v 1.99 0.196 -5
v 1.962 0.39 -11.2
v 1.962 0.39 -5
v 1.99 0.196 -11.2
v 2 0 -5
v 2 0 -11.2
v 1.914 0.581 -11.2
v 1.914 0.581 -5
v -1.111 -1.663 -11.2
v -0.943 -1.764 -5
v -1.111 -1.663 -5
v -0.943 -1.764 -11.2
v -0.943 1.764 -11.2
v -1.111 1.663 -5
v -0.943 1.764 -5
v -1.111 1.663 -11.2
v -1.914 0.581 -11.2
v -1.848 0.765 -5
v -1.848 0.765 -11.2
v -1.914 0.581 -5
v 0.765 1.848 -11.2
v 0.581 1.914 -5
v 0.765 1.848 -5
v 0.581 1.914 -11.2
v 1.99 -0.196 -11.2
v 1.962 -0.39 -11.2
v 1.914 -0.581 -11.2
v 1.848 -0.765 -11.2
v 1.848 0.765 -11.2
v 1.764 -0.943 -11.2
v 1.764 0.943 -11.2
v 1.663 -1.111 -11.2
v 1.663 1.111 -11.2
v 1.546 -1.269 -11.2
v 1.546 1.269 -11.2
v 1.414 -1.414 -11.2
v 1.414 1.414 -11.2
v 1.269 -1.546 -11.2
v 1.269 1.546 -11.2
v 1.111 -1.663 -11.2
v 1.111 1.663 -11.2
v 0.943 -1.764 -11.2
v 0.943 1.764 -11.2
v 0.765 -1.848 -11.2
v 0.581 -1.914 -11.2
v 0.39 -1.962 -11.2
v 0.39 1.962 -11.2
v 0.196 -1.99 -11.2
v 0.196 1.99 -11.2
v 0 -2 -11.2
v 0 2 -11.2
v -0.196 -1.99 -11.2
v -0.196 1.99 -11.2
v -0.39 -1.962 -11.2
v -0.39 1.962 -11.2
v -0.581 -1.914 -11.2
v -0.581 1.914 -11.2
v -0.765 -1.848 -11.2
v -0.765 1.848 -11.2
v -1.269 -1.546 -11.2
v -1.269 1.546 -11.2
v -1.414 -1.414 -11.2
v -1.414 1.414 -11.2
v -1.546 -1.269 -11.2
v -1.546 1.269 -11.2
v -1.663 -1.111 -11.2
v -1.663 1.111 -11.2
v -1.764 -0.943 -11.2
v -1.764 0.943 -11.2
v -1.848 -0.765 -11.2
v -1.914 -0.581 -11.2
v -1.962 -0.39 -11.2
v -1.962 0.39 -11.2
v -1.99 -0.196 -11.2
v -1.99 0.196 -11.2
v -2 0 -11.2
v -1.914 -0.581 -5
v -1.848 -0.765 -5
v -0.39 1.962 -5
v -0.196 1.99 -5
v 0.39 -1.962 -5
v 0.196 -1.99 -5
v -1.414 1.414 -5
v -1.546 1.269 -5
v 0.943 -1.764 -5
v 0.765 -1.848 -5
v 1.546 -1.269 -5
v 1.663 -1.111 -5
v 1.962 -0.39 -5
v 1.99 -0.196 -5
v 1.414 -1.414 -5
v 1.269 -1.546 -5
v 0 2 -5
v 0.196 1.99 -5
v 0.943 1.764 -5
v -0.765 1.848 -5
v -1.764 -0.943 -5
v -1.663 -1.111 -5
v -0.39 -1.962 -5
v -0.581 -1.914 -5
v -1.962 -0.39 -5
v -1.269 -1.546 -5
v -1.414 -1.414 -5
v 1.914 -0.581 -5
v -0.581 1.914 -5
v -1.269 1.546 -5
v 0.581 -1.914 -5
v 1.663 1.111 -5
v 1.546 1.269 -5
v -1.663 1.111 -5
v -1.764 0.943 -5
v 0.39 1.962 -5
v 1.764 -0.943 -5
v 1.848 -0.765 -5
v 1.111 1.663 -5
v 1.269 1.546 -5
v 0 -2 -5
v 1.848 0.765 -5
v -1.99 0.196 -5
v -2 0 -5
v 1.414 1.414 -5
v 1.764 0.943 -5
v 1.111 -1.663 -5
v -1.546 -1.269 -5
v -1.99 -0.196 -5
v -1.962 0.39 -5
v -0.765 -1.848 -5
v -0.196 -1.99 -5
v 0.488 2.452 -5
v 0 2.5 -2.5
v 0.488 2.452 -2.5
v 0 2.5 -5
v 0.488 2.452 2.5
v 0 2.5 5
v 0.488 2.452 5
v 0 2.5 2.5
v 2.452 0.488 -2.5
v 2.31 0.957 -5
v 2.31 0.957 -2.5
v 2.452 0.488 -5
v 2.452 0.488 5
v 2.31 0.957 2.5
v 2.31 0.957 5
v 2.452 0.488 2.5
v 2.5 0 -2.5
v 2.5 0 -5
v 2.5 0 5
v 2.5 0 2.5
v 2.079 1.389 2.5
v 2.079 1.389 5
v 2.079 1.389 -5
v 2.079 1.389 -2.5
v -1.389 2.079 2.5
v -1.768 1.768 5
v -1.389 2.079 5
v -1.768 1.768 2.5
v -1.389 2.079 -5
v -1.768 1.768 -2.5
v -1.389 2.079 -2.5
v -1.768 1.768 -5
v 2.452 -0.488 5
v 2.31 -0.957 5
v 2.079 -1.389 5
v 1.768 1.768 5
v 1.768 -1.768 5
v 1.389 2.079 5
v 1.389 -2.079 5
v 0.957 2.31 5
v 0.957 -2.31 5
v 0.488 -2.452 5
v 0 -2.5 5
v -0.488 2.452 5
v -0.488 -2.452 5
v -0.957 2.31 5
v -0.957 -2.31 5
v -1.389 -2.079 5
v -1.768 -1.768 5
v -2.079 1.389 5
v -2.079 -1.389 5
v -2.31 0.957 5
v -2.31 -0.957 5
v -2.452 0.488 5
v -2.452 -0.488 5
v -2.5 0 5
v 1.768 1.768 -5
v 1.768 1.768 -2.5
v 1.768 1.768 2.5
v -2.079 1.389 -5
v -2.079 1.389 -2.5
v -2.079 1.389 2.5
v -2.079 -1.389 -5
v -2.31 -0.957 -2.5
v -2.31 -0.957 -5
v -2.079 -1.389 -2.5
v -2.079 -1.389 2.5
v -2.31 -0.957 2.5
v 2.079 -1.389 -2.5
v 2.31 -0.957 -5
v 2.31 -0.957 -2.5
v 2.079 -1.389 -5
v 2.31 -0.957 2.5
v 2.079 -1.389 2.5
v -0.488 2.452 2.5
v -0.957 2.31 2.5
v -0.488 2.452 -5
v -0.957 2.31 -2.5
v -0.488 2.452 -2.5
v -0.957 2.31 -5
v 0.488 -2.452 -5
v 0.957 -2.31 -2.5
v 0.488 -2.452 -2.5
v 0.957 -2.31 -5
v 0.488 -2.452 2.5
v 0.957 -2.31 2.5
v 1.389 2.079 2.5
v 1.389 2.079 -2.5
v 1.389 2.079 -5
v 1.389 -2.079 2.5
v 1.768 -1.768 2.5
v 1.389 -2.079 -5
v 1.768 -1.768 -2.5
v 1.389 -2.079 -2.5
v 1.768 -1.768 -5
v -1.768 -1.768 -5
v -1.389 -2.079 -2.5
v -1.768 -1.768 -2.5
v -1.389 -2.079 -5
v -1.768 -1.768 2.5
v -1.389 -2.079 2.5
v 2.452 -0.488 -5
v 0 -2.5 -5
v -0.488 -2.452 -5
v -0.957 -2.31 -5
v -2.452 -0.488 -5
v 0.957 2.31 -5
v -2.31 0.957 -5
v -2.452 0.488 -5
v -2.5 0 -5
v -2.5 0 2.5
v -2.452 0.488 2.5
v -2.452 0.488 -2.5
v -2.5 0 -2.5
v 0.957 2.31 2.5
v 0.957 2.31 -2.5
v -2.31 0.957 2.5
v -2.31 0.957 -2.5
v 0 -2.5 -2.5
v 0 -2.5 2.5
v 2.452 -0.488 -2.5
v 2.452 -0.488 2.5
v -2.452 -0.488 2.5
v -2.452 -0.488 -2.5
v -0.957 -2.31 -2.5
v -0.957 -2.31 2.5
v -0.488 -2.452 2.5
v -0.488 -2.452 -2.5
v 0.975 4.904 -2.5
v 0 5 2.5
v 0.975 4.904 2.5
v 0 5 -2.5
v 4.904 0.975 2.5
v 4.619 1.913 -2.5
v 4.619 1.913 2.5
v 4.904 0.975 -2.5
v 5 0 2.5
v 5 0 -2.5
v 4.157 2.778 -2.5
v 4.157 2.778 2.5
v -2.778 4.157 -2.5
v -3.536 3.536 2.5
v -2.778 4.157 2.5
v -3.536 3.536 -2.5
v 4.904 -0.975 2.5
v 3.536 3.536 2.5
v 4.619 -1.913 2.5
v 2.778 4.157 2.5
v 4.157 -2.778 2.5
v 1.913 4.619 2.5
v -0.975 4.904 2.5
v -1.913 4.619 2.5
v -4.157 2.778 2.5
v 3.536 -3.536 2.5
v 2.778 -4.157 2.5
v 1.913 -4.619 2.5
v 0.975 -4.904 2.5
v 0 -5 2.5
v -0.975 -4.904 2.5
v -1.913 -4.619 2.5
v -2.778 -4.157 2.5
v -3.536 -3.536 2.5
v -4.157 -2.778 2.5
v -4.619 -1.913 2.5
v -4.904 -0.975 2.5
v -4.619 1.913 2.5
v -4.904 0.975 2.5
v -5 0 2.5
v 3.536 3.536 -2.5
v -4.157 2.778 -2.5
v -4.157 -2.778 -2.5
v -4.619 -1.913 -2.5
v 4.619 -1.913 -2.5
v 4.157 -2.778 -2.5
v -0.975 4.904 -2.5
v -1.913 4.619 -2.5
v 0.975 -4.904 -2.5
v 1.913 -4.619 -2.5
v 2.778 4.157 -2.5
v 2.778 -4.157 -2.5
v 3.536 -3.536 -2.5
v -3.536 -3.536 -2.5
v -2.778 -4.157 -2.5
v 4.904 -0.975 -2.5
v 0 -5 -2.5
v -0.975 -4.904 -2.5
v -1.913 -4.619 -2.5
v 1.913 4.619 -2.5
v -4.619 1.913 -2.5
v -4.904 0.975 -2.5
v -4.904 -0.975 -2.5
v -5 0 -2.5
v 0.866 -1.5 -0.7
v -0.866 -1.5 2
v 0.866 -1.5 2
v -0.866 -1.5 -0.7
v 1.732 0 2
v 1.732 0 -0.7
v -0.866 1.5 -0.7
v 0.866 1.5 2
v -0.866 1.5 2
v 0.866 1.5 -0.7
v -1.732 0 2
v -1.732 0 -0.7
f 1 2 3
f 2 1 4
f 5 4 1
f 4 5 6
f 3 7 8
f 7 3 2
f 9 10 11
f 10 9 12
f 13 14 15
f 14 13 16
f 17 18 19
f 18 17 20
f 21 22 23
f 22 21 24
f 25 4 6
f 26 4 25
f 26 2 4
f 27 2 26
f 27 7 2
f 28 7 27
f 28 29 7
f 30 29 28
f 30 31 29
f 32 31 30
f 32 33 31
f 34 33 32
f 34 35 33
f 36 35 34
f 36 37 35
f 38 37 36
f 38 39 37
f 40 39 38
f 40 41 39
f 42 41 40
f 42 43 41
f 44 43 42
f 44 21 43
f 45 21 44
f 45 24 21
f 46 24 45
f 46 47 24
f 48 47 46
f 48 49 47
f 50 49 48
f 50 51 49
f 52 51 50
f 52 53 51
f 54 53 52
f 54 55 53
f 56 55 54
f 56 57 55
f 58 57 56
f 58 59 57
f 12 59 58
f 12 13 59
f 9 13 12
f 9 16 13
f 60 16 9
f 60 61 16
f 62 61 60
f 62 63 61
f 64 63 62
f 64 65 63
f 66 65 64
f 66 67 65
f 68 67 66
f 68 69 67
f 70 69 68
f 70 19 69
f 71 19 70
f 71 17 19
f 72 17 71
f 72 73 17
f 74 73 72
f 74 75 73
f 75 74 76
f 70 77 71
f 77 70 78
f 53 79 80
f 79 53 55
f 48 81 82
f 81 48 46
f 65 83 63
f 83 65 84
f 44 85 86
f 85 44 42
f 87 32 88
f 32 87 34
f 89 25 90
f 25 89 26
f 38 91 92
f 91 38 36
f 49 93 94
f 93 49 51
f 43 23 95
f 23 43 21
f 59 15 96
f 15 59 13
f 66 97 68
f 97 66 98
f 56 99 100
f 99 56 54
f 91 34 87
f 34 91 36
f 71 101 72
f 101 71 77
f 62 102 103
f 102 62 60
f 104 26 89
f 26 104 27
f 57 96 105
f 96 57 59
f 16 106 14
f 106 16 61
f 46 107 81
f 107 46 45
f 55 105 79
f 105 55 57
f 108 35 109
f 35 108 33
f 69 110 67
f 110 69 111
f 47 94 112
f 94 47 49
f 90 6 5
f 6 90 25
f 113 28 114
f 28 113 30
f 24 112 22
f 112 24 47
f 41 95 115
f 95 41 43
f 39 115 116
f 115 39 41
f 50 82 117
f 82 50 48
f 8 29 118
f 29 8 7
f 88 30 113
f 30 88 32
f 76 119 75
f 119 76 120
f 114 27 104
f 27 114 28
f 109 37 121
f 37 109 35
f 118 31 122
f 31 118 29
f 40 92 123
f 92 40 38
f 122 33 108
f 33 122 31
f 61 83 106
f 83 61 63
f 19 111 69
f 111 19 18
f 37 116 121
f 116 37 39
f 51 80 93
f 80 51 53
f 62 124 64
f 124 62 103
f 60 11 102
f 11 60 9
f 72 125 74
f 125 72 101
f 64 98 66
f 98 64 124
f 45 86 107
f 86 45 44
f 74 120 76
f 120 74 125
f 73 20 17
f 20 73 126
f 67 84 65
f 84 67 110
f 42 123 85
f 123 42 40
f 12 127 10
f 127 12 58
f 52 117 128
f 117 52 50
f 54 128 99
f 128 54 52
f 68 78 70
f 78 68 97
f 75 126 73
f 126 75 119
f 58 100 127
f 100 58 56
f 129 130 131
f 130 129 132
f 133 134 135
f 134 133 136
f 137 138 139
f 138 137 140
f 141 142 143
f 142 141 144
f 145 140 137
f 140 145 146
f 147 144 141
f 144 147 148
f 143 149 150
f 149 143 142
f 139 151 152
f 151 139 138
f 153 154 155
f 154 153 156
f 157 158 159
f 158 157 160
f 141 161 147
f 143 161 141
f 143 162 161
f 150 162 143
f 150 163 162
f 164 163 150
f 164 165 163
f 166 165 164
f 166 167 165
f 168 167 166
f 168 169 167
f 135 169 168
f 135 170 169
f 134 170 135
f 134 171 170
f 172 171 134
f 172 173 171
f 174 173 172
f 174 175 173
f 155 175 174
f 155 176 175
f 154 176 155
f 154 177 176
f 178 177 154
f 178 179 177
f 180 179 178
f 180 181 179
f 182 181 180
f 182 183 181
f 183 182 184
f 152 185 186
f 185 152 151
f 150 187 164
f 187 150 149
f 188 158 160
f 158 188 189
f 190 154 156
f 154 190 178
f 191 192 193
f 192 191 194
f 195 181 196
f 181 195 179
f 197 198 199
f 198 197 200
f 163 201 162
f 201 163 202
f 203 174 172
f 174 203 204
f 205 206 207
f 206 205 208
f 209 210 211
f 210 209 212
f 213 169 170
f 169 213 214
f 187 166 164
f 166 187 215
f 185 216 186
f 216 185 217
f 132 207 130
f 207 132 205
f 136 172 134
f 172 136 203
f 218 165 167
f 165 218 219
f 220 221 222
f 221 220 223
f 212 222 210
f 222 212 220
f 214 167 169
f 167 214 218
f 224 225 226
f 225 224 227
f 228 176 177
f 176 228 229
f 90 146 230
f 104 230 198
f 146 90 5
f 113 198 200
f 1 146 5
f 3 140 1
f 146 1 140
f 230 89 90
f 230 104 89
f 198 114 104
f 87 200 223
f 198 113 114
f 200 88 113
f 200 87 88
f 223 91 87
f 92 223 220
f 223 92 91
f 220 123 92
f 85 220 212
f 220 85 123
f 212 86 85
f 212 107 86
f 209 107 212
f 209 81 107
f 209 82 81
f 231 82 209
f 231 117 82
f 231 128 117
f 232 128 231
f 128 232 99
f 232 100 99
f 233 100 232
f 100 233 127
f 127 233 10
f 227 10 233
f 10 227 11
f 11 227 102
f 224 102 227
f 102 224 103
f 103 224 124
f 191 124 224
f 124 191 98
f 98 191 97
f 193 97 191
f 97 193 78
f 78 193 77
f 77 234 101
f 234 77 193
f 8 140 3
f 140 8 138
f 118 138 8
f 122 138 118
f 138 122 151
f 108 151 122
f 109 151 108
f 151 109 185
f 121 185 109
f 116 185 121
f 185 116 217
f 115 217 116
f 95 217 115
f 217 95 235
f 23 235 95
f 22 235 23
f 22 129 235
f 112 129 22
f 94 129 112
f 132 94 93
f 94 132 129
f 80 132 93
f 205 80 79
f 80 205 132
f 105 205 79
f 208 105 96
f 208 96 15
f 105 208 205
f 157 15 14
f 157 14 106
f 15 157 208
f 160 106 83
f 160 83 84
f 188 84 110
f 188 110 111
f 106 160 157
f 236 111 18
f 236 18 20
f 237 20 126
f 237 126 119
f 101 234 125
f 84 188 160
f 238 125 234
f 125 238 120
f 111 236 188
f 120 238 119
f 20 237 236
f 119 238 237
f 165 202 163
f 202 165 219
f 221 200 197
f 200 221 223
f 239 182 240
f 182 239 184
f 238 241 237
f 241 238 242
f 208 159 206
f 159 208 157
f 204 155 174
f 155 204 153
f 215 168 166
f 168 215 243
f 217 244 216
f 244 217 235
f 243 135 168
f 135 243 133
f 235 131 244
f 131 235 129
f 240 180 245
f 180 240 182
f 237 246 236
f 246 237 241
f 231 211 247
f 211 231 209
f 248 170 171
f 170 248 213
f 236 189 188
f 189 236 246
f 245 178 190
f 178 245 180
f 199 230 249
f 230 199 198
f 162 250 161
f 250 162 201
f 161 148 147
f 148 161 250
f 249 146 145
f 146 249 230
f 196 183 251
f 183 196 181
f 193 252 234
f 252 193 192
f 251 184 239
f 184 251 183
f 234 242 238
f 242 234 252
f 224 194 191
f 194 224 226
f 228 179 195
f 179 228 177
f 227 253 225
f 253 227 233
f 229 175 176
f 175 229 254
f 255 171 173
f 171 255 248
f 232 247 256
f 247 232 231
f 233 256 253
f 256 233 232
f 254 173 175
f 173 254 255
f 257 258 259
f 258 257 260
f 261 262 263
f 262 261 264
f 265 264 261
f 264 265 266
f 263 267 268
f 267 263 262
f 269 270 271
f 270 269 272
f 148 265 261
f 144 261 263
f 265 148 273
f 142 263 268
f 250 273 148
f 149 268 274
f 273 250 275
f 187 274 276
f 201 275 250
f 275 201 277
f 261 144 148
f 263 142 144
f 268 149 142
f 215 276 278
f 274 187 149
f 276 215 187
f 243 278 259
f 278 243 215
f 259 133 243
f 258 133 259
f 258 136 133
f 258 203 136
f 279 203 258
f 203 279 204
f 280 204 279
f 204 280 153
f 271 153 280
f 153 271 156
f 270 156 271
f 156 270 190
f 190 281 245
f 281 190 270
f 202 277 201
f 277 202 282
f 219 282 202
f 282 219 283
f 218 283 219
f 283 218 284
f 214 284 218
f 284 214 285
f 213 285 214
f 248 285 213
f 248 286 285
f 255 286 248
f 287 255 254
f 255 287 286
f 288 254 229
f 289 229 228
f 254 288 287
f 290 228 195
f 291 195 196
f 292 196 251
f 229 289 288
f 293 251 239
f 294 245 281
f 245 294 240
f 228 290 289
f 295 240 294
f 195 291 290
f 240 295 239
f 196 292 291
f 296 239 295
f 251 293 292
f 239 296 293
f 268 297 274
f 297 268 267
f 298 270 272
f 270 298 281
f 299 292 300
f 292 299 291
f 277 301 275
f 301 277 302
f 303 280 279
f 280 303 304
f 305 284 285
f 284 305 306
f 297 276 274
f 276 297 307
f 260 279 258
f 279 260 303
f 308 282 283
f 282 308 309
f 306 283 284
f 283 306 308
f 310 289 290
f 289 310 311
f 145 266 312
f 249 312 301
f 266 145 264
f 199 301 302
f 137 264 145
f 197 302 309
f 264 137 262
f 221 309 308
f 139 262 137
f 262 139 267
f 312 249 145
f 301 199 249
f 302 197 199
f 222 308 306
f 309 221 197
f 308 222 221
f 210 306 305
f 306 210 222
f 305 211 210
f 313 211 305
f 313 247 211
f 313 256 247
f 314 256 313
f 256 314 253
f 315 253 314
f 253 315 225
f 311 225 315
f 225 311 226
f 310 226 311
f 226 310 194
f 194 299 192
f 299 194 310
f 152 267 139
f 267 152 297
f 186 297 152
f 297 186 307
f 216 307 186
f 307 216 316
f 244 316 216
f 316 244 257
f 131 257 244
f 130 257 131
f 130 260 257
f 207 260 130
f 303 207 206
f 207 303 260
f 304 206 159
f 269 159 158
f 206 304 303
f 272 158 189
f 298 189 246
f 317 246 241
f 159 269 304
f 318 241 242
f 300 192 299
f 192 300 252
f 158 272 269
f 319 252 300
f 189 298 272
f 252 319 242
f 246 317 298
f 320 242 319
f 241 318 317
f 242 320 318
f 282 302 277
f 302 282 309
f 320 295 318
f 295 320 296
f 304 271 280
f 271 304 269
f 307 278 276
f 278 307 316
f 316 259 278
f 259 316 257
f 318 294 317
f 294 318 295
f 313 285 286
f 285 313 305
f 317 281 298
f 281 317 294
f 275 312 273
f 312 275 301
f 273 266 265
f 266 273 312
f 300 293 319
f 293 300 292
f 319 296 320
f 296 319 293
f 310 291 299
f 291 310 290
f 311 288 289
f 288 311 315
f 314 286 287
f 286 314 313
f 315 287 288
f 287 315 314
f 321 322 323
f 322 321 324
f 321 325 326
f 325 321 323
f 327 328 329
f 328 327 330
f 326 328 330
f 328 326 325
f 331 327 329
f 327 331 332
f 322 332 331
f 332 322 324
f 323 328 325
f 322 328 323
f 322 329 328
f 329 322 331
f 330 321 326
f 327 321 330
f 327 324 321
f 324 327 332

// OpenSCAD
// Parameters
thread_nominal_diameter_mm = 4; //[2:8:0.1]
length_under_head_mm = 10; //[5:20:0.5]
head_diameter_mm = 7; //[3.5:14:0.1]
head_height_mm = 4; //[2:8:0.1]
thread_pitch_mm = 0.7; //[0.35:1.4:0.05]
thread_length_mm = 10; //[5:20:0.5]
shank_diameter_mm = 4; //[2:8:0.1]
socket_af_mm = 3; //[2:6:0.1]
socket_depth_mm = 2.5; //[1.5:5:0.1]
under_head_chamfer_height_mm = 0.6; //[0.3:1.2:0.05]
thread_runout_length_mm = 1.2; //[0.6:2.4:0.1]
overlap_mm = 0.8; //[0.2:2:0.1]
eps_mm = 0.2; //[0.05:0.5:0.05]

// Pin Socket - Custom detailed geometry
module pin_socket() {
  color("Silver") {
    // Simple representation of a pin socket
    cylinder(d=2, h=5, center=true, $fn=32);
  }
}

// Screw And Washer - Custom detailed geometry
module screw_and_washer() {
  color("DimGray") {
    // Simple representation of a screw with washer
    union() {
      cylinder(d=shank_diameter_mm, h=2, center=true, $fn=32);
      translate([0, 0, -1]) cylinder(d=shank_diameter_mm + 2, h=1, center=true, $fn=32);
    }
  }
}

// PCB Spacer - Custom detailed geometry
module pcb_spacer() {
  color("Black") {
    // Simple representation of a PCB spacer
    cylinder(d=5, h=10, center=true, $fn=32);
  }
}

// Buzzer - Custom detailed geometry
module buzzer() {
  color("Copper") {
    // Simple representation of a buzzer
    cylinder(d=10, h=5, center=true, $fn=32);
  }
}

// Main Screw with Hex Socket
module screw_with_hex_socket() {
  difference() {
    union() {
      // Cap Head
      translate([0, 0, 0])
        cylinder(r=head_diameter_mm/2, h=head_height_mm, center=true, $fn=64);
      
      // Threaded Shaft
      translate([0, 0, -head_height_mm/2 - length_under_head_mm/2 + overlap_mm])
        cylinder(r=shank_diameter_mm/2, h=length_under_head_mm, center=true, $fn=64);
      
      // Under Head Transition Fillet or Chamfer
      translate([0, 0, -head_height_mm/2 - under_head_chamfer_height_mm/2 + overlap_mm])
        cylinder(r1=head_diameter_mm/2, r2=shank_diameter_mm/2, h=under_head_chamfer_height_mm, center=true, $fn=64);
      
      // Thread Runout
      translate([0, 0, -head_height_mm/2 - under_head_chamfer_height_mm - thread_runout_length_mm/2 + overlap_mm])
        cylinder(r1=shank_diameter_mm/2, r2=shank_diameter_mm/2 - thread_pitch_mm*0.25, h=thread_runout_length_mm, center=true, $fn=64);
      
      // Pin Socket
      pin_socket();
      
      // Screw And Washer
      screw_and_washer();
      
      // PCB Spacer
      pcb_spacer();
      
      // Buzzer
      buzzer();
    }
    
    // Hex Socket Recess
    translate([0, 0, head_height_mm/2 - (socket_depth_mm + eps_mm)/2])
      cylinder(r=socket_af_mm/(2*cos(30)), h=socket_depth_mm + eps_mm, center=true, $fn=6);
  }
}

// Assembly
module assembly() {
  screw_with_hex_socket();
}

assembly();
